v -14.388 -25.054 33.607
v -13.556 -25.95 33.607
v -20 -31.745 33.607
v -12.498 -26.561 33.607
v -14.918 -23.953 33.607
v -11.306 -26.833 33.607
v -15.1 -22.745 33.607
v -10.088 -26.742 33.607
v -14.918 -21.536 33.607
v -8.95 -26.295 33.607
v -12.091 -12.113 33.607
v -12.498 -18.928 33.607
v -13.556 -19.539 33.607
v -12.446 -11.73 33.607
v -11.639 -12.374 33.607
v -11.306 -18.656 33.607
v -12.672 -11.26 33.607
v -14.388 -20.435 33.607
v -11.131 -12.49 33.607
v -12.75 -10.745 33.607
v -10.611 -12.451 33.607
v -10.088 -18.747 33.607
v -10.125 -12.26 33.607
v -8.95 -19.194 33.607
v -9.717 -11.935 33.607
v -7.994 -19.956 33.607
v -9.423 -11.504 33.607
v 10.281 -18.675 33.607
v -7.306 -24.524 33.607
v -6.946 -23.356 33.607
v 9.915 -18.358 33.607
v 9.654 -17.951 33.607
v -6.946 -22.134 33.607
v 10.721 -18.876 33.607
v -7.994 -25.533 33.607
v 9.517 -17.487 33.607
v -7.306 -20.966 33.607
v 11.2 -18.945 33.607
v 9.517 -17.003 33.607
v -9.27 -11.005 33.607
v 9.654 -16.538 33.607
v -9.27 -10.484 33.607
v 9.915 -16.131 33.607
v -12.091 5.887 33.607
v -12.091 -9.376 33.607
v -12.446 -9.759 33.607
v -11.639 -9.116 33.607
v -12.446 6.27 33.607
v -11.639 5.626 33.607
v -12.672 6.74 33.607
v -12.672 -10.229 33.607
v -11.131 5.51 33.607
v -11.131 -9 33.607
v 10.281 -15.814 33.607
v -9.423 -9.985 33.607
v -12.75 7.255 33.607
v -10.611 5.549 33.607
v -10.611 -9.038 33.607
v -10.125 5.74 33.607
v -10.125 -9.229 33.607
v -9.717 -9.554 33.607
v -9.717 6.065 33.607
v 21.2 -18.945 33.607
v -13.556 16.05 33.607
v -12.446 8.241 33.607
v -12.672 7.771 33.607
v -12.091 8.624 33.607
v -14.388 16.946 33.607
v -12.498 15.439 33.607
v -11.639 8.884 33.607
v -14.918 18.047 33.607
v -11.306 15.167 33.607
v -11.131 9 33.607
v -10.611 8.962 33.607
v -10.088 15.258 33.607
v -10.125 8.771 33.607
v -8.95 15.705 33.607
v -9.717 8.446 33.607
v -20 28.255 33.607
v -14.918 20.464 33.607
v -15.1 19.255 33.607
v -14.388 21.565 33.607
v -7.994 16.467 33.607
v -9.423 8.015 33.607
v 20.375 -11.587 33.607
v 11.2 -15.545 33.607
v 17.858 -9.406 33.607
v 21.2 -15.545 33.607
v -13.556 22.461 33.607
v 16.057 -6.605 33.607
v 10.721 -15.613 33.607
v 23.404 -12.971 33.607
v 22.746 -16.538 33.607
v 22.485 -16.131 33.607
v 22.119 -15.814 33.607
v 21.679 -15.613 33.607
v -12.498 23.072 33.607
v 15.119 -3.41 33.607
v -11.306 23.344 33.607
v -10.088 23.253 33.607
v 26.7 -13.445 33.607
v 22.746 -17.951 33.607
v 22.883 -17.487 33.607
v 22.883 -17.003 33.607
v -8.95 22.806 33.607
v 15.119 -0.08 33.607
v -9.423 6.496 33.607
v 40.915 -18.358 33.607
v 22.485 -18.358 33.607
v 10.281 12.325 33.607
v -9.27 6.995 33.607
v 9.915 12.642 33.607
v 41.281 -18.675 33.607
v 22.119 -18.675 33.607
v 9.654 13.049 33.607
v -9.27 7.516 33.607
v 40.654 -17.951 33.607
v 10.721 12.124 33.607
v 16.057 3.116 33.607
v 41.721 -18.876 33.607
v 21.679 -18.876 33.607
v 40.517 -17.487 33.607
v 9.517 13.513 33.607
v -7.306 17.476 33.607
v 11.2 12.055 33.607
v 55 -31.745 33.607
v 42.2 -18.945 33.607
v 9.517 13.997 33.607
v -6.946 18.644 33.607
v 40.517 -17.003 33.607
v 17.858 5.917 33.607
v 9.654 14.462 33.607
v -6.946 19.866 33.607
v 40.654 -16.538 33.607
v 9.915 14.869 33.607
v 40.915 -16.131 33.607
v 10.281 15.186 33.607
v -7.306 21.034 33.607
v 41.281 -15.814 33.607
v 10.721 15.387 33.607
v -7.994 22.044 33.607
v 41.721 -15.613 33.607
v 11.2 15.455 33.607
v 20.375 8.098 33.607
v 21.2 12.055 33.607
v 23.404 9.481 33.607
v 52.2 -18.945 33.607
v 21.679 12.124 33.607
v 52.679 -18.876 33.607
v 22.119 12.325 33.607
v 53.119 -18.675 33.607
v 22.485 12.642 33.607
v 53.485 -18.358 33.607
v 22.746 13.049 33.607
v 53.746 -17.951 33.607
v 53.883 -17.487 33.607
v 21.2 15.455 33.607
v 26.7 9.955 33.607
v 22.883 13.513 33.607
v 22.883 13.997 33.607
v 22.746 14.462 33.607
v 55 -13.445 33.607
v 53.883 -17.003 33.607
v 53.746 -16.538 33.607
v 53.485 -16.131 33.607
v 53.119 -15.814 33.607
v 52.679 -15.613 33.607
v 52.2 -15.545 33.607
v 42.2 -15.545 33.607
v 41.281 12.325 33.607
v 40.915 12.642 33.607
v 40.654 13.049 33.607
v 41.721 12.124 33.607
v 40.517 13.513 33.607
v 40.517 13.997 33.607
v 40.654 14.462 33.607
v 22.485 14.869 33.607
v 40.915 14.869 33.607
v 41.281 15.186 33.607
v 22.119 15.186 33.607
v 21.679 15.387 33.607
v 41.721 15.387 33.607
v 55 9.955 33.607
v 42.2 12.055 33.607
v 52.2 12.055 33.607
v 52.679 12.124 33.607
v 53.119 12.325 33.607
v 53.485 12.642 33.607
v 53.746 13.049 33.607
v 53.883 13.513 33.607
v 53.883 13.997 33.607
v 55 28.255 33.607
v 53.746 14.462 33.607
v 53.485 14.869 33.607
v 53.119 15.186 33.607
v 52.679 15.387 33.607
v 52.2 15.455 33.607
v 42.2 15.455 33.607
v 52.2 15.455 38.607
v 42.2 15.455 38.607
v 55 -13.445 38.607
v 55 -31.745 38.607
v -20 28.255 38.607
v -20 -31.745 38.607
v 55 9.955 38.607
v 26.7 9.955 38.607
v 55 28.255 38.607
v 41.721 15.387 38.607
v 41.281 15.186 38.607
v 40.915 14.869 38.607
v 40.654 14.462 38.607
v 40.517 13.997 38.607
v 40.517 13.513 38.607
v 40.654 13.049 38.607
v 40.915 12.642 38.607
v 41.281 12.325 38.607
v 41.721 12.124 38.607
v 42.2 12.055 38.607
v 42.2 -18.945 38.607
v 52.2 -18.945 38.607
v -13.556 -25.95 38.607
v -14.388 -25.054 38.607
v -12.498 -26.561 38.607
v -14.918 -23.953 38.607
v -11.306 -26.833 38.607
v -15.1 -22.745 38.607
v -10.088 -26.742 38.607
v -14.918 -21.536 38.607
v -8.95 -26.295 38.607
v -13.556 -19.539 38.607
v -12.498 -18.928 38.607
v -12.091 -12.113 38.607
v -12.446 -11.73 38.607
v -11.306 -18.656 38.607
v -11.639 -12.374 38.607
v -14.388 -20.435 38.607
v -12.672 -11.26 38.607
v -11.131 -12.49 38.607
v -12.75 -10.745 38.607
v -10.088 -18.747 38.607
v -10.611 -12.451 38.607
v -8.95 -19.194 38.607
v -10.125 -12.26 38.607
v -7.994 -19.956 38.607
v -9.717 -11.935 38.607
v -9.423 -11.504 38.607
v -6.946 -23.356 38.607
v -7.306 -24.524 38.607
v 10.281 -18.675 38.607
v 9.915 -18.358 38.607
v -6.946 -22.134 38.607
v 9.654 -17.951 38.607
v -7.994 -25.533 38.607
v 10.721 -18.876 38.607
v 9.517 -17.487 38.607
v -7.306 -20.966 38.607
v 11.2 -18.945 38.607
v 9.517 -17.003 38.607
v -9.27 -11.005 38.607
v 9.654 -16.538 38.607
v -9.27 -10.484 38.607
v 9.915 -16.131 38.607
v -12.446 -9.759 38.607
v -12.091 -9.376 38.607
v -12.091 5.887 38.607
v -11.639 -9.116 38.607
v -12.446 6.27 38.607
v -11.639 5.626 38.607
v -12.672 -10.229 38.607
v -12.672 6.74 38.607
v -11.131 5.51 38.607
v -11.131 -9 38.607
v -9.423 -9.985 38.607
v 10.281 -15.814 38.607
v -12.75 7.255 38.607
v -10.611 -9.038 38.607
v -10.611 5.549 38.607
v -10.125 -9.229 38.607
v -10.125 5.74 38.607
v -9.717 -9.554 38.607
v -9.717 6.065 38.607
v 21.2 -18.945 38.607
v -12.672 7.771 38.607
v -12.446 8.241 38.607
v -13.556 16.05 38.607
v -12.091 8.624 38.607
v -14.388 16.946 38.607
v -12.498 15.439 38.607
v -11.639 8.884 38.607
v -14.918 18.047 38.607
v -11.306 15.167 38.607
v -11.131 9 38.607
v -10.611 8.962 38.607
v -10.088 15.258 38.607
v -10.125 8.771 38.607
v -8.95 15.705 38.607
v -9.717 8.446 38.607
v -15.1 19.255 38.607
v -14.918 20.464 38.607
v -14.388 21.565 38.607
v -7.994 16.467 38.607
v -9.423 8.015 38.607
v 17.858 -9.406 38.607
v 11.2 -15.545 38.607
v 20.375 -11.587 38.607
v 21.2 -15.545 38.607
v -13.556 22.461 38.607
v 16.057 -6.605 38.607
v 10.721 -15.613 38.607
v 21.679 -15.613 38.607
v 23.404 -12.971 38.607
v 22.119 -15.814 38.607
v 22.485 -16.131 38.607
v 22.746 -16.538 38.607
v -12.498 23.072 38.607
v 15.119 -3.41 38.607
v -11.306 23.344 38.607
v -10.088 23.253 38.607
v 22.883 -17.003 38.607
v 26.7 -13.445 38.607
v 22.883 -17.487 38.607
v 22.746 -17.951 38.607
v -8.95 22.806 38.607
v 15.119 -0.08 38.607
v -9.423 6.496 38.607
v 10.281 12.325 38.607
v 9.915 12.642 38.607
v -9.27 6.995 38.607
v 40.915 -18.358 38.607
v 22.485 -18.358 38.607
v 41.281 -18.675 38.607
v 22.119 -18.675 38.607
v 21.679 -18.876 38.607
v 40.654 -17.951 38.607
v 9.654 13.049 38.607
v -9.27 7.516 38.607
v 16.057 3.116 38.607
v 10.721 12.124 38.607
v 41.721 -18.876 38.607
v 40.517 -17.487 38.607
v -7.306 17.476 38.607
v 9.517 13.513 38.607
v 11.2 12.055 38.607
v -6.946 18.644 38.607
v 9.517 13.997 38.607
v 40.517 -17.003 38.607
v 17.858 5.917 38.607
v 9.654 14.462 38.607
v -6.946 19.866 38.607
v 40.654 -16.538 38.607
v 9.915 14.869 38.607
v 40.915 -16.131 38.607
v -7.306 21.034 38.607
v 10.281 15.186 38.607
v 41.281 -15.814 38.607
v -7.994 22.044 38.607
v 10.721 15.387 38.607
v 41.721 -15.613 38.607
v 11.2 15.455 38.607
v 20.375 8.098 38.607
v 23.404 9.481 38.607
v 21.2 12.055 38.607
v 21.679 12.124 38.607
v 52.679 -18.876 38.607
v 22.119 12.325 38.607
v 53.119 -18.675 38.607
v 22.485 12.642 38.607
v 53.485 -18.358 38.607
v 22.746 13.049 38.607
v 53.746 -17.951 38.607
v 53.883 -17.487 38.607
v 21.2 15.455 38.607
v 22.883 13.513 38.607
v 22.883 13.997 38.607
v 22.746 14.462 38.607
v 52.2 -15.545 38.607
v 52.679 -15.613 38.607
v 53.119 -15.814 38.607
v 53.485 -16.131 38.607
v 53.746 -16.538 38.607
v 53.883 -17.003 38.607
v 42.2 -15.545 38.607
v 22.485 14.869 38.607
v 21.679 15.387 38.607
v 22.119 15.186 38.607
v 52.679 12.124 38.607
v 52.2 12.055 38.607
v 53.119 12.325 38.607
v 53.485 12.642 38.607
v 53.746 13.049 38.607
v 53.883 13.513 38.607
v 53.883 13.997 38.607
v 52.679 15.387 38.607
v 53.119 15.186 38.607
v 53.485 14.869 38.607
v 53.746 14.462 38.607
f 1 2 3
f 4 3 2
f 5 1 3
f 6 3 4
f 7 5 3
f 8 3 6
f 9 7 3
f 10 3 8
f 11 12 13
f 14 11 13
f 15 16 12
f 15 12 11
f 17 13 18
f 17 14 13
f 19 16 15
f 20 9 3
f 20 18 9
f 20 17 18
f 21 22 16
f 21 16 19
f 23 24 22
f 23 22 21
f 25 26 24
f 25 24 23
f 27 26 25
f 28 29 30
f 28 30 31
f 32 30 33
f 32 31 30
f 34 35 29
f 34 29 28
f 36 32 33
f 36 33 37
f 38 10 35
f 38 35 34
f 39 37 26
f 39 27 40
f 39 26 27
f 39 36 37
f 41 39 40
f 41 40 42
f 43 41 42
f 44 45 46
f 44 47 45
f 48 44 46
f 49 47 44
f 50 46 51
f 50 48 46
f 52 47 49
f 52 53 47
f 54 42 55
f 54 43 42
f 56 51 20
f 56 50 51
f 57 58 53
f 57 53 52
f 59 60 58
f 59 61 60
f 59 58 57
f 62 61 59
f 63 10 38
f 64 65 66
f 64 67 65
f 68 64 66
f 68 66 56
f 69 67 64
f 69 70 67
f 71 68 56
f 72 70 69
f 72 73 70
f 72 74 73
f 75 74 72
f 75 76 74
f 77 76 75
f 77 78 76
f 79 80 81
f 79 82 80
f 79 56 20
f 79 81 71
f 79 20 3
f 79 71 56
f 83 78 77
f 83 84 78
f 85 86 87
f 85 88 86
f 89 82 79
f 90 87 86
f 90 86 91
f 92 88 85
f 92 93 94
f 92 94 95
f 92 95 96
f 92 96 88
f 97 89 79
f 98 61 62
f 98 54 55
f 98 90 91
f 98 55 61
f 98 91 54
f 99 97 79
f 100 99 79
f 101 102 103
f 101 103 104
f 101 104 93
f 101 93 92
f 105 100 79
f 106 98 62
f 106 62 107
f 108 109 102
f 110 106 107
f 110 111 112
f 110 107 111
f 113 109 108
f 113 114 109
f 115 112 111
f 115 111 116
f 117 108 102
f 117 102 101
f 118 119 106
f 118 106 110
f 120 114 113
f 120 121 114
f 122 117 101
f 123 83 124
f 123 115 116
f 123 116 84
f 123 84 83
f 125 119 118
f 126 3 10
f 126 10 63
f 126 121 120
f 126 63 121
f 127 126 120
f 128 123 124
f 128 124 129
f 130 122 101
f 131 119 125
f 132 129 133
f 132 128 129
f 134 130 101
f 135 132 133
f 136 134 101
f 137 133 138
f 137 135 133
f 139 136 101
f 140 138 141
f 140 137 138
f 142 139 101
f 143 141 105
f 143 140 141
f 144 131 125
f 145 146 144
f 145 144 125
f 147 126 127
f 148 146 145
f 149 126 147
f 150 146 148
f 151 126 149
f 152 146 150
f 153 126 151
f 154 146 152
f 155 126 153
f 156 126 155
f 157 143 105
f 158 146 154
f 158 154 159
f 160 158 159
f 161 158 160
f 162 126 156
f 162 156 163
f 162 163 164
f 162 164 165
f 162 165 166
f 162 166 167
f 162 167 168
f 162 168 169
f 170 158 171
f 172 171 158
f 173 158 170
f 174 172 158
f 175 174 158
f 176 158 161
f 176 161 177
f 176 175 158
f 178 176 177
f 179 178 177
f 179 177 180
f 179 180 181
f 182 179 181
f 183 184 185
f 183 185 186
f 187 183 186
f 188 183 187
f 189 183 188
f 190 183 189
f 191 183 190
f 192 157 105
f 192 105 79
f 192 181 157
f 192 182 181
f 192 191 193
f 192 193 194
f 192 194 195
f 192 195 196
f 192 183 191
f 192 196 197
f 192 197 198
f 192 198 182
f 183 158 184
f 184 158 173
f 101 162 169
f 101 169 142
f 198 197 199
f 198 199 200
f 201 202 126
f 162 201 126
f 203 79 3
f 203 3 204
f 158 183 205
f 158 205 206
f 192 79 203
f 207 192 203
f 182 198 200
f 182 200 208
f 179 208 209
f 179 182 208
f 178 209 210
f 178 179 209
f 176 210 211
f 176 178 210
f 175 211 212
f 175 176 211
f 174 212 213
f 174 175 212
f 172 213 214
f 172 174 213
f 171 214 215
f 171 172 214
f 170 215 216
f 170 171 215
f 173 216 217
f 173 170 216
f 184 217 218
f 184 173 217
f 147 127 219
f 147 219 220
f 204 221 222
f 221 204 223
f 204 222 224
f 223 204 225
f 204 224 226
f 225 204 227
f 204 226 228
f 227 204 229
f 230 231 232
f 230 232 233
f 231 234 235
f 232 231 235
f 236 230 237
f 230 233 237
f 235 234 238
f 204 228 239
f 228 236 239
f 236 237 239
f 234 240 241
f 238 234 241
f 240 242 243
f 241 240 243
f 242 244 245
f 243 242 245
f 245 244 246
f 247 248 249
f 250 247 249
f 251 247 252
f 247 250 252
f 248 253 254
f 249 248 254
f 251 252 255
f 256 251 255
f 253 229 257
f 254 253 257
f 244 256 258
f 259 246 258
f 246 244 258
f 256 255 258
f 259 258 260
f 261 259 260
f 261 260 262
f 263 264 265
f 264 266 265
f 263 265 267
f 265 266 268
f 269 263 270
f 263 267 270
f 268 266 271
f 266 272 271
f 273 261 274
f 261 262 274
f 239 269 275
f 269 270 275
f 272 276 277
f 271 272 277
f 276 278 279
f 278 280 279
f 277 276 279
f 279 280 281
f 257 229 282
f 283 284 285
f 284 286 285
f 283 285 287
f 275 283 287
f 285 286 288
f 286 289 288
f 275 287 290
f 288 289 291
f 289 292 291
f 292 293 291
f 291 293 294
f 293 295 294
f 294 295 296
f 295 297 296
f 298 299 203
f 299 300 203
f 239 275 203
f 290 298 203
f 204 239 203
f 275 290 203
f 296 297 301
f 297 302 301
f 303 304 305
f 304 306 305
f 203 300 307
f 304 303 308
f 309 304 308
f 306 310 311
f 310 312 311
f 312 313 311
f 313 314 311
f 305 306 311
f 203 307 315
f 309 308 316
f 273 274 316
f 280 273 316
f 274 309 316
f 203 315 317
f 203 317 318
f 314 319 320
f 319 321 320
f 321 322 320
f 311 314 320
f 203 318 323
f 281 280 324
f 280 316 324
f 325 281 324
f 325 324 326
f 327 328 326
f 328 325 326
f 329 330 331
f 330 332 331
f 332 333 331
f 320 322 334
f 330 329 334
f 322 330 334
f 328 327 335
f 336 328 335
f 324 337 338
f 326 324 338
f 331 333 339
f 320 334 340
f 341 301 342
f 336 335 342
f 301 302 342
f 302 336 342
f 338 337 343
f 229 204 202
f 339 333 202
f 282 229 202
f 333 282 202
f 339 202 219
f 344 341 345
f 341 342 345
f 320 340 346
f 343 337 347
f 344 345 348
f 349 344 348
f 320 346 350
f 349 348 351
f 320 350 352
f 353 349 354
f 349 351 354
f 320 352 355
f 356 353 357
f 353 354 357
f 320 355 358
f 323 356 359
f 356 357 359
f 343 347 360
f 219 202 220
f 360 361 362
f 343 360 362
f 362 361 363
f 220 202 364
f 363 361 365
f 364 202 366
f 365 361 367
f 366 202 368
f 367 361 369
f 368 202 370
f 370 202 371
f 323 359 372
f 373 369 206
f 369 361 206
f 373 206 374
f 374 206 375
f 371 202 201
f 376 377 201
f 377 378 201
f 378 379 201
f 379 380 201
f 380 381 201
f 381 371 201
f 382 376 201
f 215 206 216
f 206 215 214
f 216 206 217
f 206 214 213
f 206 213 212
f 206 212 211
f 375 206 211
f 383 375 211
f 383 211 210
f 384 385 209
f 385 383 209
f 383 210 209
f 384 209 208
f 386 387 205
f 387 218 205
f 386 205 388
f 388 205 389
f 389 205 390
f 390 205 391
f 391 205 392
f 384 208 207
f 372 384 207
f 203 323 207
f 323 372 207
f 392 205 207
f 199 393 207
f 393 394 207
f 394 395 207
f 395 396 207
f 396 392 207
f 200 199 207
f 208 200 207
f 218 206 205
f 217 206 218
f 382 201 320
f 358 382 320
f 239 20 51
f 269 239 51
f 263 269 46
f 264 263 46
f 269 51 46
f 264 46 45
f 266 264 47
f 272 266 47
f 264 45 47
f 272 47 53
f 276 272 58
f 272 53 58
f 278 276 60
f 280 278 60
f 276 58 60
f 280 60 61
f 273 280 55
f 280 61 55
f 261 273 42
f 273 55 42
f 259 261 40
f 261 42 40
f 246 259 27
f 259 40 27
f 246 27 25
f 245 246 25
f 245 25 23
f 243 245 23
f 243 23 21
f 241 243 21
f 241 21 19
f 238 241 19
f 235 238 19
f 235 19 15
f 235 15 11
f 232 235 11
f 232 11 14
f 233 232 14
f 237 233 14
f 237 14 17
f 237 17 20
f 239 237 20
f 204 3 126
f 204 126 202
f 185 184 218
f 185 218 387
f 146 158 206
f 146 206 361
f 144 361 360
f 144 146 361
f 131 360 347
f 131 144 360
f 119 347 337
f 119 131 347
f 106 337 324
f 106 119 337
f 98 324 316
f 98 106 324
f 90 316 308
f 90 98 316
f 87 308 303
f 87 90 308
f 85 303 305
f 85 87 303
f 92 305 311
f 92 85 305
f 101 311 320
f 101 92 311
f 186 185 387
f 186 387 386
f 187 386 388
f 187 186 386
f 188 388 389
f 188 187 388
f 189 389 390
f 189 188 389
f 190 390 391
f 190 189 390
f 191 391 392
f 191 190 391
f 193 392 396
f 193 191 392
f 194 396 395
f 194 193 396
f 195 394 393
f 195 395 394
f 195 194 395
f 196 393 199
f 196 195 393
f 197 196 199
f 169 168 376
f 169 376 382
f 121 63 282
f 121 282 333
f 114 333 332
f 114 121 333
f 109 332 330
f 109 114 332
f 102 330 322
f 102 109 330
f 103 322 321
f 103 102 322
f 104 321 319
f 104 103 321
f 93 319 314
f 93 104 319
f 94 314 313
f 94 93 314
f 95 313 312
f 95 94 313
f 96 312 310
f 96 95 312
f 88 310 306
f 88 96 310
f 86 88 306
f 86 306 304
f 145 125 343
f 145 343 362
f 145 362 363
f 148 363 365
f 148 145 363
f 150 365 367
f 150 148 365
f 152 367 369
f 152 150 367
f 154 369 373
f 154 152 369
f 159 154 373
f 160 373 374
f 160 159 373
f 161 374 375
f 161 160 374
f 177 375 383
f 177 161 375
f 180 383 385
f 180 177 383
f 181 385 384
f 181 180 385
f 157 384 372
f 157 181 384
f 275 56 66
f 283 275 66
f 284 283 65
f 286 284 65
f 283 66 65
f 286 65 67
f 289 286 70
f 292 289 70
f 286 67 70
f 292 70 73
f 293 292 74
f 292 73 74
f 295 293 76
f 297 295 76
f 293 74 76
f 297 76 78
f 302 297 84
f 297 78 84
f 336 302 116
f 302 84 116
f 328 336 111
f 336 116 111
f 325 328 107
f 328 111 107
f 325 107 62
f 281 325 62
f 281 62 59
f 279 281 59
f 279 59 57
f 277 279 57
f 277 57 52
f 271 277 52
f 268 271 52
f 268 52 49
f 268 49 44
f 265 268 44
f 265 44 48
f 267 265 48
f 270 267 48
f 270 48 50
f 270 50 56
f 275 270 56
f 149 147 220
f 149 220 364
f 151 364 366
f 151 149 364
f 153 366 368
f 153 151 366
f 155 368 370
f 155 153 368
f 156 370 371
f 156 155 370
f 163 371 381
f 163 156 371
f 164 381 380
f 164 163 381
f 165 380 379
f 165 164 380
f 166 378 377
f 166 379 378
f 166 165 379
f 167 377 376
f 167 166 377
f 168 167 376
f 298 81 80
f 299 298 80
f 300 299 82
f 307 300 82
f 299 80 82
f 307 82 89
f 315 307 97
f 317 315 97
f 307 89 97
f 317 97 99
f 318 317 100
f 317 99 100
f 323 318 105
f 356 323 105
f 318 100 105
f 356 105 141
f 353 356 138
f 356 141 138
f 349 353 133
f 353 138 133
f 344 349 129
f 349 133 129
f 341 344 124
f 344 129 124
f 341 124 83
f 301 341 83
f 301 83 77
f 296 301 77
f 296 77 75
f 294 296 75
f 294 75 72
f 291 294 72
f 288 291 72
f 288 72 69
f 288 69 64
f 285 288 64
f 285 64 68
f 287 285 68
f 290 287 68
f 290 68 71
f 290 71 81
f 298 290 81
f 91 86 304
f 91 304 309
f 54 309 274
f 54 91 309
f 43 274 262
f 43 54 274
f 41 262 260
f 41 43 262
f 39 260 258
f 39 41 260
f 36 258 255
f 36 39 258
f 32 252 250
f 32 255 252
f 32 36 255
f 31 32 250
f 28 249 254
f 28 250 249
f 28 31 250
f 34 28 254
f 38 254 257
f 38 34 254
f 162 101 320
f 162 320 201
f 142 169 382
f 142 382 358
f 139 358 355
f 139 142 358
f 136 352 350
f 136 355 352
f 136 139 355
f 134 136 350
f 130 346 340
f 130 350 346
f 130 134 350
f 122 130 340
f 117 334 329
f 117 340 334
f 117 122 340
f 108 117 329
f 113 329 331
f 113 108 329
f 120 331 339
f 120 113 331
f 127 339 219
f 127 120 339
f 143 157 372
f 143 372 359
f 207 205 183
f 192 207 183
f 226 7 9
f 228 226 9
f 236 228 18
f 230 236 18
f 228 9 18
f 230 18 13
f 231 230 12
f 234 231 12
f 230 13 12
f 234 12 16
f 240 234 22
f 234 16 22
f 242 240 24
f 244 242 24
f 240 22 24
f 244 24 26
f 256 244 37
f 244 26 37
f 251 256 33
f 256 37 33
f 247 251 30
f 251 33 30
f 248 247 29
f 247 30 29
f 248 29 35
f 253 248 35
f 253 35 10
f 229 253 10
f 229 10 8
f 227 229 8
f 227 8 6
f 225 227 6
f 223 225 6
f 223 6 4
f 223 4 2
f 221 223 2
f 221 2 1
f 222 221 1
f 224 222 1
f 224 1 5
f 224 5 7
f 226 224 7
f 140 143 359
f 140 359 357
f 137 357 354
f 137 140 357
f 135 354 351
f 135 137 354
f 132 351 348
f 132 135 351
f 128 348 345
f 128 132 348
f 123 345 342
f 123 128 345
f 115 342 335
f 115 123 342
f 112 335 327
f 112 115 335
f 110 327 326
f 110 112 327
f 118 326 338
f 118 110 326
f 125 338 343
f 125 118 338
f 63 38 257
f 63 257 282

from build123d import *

# Parameters (mm, degrees)
SKETCH1_W           = 5
SKETCH1_H           = 60
BOSS_EXTRUDE1_DEPTH = 5
SKETCH2_W           = 5
SKETCH2_H           = 60
BOSS_EXTRUDE2_DEPTH = 50
CUT_EXTRUDE4_DEPTH  = 6
CUT_EXTRUDE5_DEPTH  = 6
SKETCH7_W           = 5
SKETCH7_H           = 60
BOSS_EXTRUDE3_DEPTH = 20
SKETCH8_R           = 4.1
SKETCH8_R_2         = 1.75
CUT_EXTRUDE6_DEPTH  = 6


with BuildPart() as part:
    # Sketch1 → Boss-Extrude1 (new body)
    with BuildSketch(Plane(origin=(0, 0, 0), x_dir=(0, 0, -1), z_dir=(1, 0, 0))):
        with Locations((-36.107304337, -1.744616853)):
            Rectangle(SKETCH1_W, SKETCH1_H)
    extrude(amount=BOSS_EXTRUDE1_DEPTH)

    # Sketch2 → Boss-Extrude2 (add)
    with BuildSketch(Plane(origin=(5, 0, 0), x_dir=(0, 0, -1), z_dir=(1, 0, 0))):
        with Locations((-36.107304337, -1.744616853)):
            Rectangle(SKETCH2_W, SKETCH2_H)
    extrude(amount=BOSS_EXTRUDE2_DEPTH)

    # Sketch5 → Cut-Extrude4 (cut, through all)
    with BuildSketch(Plane(origin=(0, 0, 33.607304337), x_dir=(-1, 0, 0), z_dir=(0, 0, -1))):
        with BuildLine():
            Line((-26.7, -13.444616853), (-56.7, -13.444616853))
            ThreePointArc((-56.7, -13.444616853), (-68.4, -1.744616853), (-56.7, 9.955383147))
            Line((-56.7, 9.955383147), (-26.7, 9.955383147))
            ThreePointArc((-26.7, 9.955383147), (-15, -1.744616853), (-26.7, -13.444616853))
        make_face()
    extrude(amount=-CUT_EXTRUDE4_DEPTH, mode=Mode.SUBTRACT)

    # Sketch6 → Cut-Extrude5 (cut, through all)
    with BuildSketch(Plane(origin=(0, 0, 33.607304337), x_dir=(-1, 0, 0), z_dir=(0, 0, -1))):
        with BuildLine():
            Line((-42.2, 12.055383147), (-52.2, 12.055383147))
            ThreePointArc((-52.2, 12.055383147), (-53.9, 13.755383147), (-52.2, 15.455383147))
            Line((-52.2, 15.455383147), (-42.2, 15.455383147))
            ThreePointArc((-42.2, 15.455383147), (-40.5, 13.755383147), (-42.2, 12.055383147))
        make_face()
        with BuildLine():
            Line((-42.2, -18.944616853), (-52.2, -18.944616853))
            ThreePointArc((-52.2, -18.944616853), (-53.9, -17.244616853), (-52.2, -15.544616853))
            Line((-52.2, -15.544616853), (-42.2, -15.544616853))
            ThreePointArc((-42.2, -15.544616853), (-40.5, -17.244616853), (-42.2, -18.944616853))
        make_face()
        with BuildLine():
            Line((-11.2, -18.944616853), (-21.2, -18.944616853))
            ThreePointArc((-21.2, -18.944616853), (-22.9, -17.244616853), (-21.2, -15.544616853))
            Line((-21.2, -15.544616853), (-11.2, -15.544616853))
            ThreePointArc((-11.2, -15.544616853), (-9.5, -17.244616853), (-11.2, -18.944616853))
        make_face()
        with BuildLine():
            Line((-11.2, 12.055383147), (-21.2, 12.055383147))
            ThreePointArc((-21.2, 12.055383147), (-22.9, 13.755383147), (-21.2, 15.455383147))
            Line((-21.2, 15.455383147), (-11.2, 15.455383147))
            ThreePointArc((-11.2, 15.455383147), (-9.5, 13.755383147), (-11.2, 12.055383147))
        make_face()
    extrude(amount=-CUT_EXTRUDE5_DEPTH, mode=Mode.SUBTRACT)

    # Sketch7 → Boss-Extrude3 (add)
    with BuildSketch(Plane.ZY):
        with Locations((36.107304337, -1.744616853)):
            Rectangle(SKETCH7_W, SKETCH7_H)
    extrude(amount=BOSS_EXTRUDE3_DEPTH)

    # Sketch8 → Cut-Extrude6 (cut, through all)
    with BuildSketch(Plane(origin=(0, 0, 33.607304337), x_dir=(-1, 0, 0), z_dir=(0, 0, -1))):
        with Locations((11, 19.255383147)):
            Circle(SKETCH8_R)
        with Locations((11, -22.744616853)):
            Circle(SKETCH8_R)
        with Locations((11, -10.744616853)):
            Circle(SKETCH8_R_2)
        with Locations((11, 7.255383147)):
            Circle(SKETCH8_R_2)
    extrude(amount=-CUT_EXTRUDE6_DEPTH, mode=Mode.SUBTRACT)


solid = part.part
